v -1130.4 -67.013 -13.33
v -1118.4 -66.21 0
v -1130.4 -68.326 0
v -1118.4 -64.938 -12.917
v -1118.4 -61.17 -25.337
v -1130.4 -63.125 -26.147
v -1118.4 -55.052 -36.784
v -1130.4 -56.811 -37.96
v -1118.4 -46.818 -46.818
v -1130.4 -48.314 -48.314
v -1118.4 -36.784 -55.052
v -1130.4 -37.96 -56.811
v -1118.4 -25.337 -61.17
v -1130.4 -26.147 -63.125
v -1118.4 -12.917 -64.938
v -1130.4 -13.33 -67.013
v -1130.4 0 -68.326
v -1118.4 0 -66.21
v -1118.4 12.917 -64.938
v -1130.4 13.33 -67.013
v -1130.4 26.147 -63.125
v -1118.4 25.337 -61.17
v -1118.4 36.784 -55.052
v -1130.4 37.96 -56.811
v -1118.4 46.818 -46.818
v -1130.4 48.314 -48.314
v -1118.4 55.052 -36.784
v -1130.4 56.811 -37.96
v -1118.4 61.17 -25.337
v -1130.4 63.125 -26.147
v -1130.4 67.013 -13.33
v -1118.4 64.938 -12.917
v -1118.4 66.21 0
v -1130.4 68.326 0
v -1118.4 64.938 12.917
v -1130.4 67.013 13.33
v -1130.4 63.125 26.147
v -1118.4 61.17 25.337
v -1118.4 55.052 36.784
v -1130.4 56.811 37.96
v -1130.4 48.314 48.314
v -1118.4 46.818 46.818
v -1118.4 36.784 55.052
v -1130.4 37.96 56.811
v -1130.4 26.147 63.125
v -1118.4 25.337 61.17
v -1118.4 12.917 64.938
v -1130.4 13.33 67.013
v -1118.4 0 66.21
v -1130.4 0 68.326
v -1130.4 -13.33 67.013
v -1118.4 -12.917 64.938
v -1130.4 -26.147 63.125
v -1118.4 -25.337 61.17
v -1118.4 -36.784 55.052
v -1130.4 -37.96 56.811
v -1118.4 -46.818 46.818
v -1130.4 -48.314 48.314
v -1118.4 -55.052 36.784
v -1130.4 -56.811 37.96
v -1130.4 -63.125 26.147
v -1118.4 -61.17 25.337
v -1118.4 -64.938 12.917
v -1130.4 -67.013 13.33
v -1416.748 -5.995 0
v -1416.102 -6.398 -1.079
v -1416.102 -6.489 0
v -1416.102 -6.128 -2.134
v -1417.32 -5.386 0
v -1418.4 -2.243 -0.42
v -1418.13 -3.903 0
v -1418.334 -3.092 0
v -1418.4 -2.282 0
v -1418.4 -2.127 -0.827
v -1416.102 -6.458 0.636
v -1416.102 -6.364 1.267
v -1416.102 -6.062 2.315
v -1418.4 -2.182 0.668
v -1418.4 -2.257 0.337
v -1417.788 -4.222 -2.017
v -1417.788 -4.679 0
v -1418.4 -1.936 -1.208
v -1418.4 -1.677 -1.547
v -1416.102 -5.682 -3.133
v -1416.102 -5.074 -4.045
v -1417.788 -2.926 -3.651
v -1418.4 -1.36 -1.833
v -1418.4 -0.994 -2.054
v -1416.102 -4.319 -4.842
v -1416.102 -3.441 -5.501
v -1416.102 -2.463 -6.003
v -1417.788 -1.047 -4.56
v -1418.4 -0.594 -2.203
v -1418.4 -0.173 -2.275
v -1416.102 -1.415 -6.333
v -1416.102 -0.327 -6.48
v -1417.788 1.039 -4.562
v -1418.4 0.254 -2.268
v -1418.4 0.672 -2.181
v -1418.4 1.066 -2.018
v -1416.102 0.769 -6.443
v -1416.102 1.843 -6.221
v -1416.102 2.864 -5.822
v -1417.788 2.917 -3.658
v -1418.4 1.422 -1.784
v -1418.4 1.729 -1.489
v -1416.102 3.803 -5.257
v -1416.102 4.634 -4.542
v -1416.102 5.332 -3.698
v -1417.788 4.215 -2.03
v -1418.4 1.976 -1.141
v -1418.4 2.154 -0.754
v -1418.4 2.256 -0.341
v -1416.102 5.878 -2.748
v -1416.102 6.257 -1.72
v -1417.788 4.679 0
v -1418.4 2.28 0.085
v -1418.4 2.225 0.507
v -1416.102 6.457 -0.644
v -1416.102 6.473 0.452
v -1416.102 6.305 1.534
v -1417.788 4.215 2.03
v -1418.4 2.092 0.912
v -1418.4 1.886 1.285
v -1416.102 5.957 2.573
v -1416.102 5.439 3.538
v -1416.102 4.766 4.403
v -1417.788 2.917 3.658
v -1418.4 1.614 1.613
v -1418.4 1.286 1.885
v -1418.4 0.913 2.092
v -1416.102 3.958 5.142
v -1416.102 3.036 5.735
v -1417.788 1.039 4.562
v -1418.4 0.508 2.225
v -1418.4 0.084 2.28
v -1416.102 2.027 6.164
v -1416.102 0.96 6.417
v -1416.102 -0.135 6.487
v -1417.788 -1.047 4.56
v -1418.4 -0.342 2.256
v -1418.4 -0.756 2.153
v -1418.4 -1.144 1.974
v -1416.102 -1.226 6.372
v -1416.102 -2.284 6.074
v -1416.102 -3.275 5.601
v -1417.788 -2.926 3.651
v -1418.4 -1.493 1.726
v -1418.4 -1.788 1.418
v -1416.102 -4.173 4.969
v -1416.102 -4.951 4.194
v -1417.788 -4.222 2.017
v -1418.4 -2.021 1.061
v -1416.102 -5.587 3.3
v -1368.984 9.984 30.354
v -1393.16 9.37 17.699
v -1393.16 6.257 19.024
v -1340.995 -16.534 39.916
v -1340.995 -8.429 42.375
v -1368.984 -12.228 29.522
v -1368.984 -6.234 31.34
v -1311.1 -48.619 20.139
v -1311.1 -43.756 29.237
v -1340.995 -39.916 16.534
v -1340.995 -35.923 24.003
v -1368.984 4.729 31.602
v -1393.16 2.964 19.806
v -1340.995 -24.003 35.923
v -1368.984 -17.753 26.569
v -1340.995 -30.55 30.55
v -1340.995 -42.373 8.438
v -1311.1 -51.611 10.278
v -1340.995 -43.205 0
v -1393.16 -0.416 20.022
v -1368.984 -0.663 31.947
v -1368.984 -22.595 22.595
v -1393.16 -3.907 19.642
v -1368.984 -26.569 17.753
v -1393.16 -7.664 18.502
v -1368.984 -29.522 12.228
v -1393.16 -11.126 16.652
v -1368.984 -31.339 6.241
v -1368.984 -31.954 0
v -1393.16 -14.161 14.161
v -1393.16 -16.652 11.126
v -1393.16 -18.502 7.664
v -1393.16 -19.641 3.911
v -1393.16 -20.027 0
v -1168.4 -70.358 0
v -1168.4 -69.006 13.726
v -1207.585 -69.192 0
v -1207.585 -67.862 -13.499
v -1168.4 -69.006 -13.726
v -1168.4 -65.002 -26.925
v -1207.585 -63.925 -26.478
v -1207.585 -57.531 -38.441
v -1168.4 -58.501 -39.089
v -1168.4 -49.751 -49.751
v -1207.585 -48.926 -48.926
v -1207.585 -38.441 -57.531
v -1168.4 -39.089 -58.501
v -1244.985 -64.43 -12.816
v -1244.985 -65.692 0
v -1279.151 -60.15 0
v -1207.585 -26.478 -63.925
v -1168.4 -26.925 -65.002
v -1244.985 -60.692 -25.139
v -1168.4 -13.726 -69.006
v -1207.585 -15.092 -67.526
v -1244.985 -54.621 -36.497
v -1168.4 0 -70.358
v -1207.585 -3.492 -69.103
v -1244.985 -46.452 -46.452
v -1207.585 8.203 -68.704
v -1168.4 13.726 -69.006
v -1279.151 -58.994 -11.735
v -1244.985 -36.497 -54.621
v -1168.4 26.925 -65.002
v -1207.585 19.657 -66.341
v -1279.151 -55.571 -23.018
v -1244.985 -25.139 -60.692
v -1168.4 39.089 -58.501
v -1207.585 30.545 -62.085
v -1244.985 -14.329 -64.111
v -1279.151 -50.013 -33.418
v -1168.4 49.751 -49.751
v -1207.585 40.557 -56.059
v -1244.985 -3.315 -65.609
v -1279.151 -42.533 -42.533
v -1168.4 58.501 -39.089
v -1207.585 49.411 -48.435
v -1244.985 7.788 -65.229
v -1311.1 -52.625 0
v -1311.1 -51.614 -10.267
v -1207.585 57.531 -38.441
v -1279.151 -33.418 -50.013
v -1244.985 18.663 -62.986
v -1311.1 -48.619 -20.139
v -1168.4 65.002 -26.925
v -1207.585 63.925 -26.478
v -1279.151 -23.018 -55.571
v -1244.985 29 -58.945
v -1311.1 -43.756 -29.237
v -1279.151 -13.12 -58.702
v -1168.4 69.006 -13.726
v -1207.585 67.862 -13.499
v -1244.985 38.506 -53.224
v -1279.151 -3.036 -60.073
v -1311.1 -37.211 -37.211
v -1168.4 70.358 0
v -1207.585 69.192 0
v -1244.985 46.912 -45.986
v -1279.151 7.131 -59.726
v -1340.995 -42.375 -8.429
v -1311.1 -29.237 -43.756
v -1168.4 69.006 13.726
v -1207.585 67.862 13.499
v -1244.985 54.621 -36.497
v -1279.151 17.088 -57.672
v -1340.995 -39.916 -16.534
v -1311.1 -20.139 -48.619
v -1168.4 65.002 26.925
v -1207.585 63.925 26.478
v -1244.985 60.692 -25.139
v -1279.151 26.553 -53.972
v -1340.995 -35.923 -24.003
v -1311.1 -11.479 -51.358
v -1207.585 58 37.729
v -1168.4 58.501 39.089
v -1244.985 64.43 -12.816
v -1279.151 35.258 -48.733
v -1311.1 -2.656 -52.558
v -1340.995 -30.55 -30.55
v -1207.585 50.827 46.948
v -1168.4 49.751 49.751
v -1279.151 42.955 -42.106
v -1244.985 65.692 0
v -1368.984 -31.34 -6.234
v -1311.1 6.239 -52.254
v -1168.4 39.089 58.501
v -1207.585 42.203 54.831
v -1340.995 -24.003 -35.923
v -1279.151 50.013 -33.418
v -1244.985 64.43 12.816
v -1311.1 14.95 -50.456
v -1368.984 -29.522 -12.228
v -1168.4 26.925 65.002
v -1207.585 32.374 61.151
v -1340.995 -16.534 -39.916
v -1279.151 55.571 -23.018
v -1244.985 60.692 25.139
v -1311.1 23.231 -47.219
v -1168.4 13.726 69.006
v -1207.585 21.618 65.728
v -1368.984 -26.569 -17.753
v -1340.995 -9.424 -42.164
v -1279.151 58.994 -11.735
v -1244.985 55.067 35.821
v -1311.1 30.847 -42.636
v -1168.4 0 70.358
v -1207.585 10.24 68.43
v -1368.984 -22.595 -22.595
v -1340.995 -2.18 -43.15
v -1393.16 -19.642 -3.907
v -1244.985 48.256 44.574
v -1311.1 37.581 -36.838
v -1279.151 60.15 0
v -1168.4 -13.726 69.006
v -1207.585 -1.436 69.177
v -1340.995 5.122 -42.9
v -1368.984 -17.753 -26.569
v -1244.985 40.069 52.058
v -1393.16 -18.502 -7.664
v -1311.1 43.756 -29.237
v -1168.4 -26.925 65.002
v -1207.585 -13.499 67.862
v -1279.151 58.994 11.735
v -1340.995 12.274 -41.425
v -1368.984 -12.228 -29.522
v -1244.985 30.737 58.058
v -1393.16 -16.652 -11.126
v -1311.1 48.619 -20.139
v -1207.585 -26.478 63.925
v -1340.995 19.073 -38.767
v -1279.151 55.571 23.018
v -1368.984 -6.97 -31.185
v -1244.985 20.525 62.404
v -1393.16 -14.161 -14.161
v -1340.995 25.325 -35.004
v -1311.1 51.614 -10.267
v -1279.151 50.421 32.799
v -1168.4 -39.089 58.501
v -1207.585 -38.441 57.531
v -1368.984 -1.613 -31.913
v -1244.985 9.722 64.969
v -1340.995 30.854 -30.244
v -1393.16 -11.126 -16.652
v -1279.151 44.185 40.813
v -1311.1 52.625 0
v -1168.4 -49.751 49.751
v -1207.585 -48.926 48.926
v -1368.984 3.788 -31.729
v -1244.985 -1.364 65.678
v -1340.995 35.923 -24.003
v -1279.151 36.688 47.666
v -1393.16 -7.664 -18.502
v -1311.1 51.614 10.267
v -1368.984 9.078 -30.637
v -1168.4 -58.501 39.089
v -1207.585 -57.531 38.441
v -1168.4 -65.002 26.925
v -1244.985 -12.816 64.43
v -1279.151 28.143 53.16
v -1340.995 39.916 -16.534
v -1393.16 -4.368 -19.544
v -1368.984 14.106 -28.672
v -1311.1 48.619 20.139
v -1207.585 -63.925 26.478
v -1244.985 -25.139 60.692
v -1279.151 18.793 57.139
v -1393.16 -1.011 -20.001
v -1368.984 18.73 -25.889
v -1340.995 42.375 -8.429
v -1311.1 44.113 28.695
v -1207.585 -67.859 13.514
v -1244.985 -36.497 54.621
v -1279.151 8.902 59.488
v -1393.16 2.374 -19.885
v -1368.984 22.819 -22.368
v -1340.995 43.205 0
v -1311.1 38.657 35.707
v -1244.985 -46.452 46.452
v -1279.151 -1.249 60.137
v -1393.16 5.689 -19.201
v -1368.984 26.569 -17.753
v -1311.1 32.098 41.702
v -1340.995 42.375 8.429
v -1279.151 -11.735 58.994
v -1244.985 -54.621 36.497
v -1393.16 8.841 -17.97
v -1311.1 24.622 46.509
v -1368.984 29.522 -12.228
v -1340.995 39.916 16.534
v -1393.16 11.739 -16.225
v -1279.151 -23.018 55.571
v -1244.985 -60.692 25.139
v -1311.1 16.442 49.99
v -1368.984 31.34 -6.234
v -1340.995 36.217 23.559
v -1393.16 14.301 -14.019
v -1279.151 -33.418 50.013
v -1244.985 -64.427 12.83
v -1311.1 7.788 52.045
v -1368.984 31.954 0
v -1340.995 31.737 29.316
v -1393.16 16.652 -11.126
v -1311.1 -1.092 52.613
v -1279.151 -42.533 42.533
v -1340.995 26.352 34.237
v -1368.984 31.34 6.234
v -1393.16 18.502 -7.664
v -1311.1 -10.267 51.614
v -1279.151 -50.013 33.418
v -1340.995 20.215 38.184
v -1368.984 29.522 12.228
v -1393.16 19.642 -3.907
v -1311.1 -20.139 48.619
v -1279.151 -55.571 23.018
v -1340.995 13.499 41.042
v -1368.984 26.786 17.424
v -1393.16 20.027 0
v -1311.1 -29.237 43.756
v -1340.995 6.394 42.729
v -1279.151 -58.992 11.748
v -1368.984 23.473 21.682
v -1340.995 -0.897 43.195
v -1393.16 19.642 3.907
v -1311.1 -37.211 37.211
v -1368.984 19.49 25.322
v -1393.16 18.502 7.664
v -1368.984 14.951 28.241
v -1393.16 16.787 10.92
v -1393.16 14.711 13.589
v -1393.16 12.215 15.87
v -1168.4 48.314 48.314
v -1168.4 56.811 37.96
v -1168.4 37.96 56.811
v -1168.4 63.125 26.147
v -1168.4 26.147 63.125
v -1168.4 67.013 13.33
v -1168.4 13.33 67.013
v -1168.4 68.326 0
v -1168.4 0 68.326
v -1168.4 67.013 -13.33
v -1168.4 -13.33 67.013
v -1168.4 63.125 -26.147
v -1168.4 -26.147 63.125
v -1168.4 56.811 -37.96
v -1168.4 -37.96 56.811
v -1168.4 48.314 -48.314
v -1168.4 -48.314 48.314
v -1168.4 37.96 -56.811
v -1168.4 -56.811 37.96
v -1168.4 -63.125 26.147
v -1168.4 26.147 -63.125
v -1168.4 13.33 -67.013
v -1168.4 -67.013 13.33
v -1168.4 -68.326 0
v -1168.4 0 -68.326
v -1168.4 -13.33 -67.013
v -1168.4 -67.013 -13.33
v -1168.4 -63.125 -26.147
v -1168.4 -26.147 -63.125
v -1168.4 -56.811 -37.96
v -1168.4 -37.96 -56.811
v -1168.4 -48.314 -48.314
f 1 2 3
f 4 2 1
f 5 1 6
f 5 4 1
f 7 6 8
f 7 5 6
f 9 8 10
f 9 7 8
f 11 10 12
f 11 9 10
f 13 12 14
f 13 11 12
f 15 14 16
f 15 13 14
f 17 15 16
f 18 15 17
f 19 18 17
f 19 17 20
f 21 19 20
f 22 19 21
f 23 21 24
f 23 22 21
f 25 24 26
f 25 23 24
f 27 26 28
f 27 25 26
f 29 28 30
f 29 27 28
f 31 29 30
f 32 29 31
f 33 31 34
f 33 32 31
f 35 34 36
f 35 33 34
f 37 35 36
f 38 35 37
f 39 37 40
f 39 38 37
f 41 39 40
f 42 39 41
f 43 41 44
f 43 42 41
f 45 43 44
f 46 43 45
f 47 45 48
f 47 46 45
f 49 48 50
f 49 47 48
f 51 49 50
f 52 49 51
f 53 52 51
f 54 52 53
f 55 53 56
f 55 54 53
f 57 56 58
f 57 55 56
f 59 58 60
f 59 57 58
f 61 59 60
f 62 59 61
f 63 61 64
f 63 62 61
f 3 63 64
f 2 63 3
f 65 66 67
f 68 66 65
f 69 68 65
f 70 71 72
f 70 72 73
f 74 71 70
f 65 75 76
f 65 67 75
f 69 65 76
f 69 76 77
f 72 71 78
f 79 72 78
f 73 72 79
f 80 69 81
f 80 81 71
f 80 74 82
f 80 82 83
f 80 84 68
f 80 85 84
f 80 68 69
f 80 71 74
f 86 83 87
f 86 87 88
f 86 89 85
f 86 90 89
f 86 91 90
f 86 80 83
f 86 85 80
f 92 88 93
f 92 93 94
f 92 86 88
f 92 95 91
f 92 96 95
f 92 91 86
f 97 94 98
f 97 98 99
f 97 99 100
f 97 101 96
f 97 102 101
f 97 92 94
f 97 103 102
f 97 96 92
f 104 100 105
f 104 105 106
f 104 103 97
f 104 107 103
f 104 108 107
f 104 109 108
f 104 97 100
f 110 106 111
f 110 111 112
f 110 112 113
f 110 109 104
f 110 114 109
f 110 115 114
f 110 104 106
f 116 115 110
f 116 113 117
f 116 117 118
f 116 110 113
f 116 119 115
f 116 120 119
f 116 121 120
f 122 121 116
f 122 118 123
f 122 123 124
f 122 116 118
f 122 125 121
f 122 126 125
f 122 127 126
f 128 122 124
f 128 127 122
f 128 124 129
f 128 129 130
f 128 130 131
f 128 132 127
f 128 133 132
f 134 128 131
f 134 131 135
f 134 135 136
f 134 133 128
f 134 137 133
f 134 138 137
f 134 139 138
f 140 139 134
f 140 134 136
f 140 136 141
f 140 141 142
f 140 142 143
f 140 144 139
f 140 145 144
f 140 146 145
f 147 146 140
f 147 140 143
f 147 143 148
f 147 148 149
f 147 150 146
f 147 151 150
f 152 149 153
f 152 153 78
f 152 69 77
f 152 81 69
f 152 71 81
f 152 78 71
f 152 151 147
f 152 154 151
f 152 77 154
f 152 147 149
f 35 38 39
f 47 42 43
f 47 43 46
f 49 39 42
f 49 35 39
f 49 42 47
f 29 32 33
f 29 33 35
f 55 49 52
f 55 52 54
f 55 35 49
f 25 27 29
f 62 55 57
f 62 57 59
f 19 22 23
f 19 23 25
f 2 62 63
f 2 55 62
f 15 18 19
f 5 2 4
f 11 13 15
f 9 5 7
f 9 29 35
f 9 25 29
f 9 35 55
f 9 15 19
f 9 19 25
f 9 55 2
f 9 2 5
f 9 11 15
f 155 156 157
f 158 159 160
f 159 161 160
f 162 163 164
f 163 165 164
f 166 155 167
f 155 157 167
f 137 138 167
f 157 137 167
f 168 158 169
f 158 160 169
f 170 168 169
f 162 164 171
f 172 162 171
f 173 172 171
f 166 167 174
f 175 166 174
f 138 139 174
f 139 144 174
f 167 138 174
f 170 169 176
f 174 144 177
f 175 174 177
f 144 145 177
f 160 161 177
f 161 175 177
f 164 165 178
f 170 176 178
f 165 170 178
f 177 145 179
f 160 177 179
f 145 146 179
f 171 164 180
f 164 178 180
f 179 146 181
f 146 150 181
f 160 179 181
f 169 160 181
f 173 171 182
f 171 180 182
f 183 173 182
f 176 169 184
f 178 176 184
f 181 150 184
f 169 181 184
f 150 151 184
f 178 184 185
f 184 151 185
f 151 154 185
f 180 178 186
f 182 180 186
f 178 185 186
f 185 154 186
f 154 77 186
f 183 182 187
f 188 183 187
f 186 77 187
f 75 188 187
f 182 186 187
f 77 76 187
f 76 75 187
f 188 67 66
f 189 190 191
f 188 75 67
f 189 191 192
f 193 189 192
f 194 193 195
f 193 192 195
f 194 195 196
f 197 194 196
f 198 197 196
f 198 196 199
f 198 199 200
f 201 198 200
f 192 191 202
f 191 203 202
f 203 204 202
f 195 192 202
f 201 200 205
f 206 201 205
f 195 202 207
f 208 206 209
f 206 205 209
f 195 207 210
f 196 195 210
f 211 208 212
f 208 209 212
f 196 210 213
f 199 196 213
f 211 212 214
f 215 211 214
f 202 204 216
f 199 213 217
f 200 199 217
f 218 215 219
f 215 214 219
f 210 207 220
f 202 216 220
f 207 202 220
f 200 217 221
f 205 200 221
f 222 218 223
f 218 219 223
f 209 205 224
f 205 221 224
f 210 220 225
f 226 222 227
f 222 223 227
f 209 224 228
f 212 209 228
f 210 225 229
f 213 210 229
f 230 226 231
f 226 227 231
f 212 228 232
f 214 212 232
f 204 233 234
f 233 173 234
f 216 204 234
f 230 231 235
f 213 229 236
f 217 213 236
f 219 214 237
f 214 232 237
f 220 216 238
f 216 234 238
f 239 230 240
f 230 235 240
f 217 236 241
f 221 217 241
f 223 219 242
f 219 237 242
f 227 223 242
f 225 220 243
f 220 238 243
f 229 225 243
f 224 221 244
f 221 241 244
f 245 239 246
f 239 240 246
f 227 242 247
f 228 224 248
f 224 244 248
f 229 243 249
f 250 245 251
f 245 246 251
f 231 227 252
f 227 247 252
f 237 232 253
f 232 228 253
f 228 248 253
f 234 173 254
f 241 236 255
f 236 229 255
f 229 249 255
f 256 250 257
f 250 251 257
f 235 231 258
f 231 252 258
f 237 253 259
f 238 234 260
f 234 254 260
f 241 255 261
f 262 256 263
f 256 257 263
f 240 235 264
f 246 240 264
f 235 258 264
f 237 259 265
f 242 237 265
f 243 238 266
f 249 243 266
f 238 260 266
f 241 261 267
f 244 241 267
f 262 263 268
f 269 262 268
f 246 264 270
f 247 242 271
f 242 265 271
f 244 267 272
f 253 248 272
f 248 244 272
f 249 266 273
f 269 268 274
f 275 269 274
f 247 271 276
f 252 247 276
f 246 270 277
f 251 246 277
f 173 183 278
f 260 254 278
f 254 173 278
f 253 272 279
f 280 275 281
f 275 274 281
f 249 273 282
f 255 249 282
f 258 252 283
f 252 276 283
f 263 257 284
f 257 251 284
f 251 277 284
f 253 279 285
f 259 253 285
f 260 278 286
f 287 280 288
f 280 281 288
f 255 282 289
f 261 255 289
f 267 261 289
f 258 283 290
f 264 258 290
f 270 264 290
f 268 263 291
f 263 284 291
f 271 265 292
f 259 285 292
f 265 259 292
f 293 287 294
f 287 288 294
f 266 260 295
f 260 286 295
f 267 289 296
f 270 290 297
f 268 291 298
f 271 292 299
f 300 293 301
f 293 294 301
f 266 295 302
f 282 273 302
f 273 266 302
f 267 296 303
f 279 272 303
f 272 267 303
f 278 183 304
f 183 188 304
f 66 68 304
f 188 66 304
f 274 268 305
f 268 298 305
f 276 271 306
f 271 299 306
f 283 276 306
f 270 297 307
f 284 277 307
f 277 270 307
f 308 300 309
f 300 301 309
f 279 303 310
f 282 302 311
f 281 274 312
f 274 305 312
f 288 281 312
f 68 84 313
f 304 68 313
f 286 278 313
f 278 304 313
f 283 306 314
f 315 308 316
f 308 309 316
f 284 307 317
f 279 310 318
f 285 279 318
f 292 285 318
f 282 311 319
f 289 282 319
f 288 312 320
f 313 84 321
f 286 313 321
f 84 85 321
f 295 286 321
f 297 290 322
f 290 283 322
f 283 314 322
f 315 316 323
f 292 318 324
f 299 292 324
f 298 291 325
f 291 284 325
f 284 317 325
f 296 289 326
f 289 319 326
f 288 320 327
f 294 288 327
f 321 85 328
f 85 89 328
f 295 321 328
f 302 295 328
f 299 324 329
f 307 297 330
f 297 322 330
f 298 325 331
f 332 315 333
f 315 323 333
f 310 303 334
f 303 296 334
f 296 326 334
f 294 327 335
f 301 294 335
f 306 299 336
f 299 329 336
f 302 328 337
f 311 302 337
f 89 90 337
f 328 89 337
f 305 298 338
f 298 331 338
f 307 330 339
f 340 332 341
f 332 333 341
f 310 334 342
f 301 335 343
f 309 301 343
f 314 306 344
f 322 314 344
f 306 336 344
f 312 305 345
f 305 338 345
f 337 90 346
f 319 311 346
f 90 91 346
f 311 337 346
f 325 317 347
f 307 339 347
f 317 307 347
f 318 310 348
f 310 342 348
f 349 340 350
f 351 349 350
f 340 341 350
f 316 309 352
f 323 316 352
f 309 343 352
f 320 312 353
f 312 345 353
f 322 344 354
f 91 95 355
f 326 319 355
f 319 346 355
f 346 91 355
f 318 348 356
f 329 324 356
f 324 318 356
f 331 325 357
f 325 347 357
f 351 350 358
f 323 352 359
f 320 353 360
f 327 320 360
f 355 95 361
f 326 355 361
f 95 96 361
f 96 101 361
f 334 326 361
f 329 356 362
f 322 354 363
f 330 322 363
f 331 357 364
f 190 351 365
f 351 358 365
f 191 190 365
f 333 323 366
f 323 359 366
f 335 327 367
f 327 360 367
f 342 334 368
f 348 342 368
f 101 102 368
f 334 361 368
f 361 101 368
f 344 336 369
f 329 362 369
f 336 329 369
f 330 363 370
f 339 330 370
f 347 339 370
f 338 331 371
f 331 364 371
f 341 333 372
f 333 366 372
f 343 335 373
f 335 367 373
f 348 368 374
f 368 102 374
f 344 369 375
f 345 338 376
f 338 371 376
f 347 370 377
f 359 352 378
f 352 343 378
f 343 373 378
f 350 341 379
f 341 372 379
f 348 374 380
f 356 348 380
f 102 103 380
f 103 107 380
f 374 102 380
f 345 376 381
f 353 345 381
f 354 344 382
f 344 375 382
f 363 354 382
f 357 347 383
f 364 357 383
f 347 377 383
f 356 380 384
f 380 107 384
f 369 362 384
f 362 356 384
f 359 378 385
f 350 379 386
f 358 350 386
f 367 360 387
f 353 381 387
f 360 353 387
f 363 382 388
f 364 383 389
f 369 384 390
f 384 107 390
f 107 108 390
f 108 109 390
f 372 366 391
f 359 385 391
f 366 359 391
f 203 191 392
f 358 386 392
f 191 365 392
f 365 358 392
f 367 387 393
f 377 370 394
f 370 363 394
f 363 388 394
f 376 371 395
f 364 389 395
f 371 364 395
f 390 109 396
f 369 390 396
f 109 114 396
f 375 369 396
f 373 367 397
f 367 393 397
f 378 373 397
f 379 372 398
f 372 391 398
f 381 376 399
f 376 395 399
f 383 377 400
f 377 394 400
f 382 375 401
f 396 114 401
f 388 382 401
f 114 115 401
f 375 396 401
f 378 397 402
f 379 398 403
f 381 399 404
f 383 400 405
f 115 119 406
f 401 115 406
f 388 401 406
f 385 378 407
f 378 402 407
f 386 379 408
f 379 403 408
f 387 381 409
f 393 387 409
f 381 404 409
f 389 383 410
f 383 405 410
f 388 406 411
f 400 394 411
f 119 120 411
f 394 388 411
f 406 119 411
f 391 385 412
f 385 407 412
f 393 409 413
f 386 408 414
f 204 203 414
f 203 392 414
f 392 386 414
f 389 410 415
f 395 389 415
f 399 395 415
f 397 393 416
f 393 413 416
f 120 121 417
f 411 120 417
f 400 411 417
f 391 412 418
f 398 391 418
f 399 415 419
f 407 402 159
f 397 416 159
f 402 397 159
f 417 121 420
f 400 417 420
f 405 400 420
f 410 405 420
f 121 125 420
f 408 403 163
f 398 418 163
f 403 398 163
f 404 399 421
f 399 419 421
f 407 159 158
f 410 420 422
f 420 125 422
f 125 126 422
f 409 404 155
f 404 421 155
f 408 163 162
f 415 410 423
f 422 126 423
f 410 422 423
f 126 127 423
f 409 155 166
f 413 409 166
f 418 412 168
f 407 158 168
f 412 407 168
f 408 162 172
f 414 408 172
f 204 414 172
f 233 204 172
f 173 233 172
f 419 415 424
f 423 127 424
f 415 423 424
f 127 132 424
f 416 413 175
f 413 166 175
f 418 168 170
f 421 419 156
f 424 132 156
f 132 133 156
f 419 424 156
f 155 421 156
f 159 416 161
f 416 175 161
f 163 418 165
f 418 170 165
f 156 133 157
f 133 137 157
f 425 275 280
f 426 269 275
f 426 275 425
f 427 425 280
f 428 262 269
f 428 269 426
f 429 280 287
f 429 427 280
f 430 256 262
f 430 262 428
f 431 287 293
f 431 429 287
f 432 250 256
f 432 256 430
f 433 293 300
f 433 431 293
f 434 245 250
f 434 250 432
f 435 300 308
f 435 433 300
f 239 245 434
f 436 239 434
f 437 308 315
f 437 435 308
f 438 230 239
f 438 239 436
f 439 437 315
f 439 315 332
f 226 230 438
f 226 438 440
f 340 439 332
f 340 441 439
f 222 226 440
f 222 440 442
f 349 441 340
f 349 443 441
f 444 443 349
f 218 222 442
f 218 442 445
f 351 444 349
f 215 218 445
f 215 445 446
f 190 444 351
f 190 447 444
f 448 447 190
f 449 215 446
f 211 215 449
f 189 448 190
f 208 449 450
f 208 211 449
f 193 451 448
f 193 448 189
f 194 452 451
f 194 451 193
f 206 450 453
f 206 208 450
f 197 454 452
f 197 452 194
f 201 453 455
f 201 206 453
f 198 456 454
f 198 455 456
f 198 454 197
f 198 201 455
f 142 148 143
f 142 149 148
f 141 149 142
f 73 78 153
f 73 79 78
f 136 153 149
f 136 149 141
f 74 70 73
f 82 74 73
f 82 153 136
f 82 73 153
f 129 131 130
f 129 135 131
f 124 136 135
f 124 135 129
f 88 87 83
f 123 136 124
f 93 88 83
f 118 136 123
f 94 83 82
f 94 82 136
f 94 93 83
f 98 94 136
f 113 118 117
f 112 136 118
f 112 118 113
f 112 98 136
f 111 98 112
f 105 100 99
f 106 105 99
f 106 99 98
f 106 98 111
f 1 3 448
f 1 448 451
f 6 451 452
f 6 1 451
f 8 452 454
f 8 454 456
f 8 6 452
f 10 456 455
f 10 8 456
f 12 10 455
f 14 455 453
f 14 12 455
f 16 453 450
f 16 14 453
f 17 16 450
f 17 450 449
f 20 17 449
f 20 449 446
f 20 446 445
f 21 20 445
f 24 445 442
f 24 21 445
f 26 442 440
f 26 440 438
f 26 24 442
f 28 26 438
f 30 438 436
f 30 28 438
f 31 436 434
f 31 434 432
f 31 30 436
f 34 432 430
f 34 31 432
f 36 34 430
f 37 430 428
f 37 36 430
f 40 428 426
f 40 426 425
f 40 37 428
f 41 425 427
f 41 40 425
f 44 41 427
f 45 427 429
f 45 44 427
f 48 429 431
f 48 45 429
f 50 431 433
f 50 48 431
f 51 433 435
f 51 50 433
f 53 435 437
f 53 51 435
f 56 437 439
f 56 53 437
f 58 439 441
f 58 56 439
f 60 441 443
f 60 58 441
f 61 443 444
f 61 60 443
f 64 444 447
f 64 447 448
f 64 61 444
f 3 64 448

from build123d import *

# Parameters (mm, degrees)
CHAMFER_ANGLE = 10
CHAMFER_SIZE  = 12
FILLET003_R   = 5


with BuildPart() as part:
    # Sketch012 → Revolution003 (revolve)
    with BuildSketch(Plane.XY):
        with BuildLine():
            Line((-1168.4, 0), (-1418.4, 0))
            Line((-1418.4, 0), (-1418.4, -5))
            add(Edge.make_bspline(
                [(-1168.4, -70.358), (-1318.4, -70.358), (-1418.4, -5)],
                knots=[0, 0, 0, 1, 1, 1], degree=2))
            Line((-1168.4, -70.358), (-1168.4, -68.326))
            Line((-1168.4, -68.326), (-1118.4, -68.326))
            Line((-1118.4, -68.326), (-1118.4, 0))
            Line((-1118.4, 0), (-1168.4, 0))
        make_face()
    revolve(axis=Axis((0, 0, 0), (1, 0, 0)))

    # Chamfer
    chamfer_edges = [part.edges().sort_by_distance(p)[0] for p in [
        (-1118.4, 68.326, 0),
    ]]
    chamfer_side = part.faces().sort_by_distance((-1143.4, 68.326, 0))[0]
    chamfer(chamfer_edges, length=CHAMFER_SIZE, angle=CHAMFER_ANGLE, reference=chamfer_side)

    # Fillet003
    fillet003_edges = [part.edges().sort_by_distance(p)[0] for p in [
        (-1418.4, 5, 0),
    ]]
    fillet(fillet003_edges, radius=FILLET003_R)


solid = part.part
